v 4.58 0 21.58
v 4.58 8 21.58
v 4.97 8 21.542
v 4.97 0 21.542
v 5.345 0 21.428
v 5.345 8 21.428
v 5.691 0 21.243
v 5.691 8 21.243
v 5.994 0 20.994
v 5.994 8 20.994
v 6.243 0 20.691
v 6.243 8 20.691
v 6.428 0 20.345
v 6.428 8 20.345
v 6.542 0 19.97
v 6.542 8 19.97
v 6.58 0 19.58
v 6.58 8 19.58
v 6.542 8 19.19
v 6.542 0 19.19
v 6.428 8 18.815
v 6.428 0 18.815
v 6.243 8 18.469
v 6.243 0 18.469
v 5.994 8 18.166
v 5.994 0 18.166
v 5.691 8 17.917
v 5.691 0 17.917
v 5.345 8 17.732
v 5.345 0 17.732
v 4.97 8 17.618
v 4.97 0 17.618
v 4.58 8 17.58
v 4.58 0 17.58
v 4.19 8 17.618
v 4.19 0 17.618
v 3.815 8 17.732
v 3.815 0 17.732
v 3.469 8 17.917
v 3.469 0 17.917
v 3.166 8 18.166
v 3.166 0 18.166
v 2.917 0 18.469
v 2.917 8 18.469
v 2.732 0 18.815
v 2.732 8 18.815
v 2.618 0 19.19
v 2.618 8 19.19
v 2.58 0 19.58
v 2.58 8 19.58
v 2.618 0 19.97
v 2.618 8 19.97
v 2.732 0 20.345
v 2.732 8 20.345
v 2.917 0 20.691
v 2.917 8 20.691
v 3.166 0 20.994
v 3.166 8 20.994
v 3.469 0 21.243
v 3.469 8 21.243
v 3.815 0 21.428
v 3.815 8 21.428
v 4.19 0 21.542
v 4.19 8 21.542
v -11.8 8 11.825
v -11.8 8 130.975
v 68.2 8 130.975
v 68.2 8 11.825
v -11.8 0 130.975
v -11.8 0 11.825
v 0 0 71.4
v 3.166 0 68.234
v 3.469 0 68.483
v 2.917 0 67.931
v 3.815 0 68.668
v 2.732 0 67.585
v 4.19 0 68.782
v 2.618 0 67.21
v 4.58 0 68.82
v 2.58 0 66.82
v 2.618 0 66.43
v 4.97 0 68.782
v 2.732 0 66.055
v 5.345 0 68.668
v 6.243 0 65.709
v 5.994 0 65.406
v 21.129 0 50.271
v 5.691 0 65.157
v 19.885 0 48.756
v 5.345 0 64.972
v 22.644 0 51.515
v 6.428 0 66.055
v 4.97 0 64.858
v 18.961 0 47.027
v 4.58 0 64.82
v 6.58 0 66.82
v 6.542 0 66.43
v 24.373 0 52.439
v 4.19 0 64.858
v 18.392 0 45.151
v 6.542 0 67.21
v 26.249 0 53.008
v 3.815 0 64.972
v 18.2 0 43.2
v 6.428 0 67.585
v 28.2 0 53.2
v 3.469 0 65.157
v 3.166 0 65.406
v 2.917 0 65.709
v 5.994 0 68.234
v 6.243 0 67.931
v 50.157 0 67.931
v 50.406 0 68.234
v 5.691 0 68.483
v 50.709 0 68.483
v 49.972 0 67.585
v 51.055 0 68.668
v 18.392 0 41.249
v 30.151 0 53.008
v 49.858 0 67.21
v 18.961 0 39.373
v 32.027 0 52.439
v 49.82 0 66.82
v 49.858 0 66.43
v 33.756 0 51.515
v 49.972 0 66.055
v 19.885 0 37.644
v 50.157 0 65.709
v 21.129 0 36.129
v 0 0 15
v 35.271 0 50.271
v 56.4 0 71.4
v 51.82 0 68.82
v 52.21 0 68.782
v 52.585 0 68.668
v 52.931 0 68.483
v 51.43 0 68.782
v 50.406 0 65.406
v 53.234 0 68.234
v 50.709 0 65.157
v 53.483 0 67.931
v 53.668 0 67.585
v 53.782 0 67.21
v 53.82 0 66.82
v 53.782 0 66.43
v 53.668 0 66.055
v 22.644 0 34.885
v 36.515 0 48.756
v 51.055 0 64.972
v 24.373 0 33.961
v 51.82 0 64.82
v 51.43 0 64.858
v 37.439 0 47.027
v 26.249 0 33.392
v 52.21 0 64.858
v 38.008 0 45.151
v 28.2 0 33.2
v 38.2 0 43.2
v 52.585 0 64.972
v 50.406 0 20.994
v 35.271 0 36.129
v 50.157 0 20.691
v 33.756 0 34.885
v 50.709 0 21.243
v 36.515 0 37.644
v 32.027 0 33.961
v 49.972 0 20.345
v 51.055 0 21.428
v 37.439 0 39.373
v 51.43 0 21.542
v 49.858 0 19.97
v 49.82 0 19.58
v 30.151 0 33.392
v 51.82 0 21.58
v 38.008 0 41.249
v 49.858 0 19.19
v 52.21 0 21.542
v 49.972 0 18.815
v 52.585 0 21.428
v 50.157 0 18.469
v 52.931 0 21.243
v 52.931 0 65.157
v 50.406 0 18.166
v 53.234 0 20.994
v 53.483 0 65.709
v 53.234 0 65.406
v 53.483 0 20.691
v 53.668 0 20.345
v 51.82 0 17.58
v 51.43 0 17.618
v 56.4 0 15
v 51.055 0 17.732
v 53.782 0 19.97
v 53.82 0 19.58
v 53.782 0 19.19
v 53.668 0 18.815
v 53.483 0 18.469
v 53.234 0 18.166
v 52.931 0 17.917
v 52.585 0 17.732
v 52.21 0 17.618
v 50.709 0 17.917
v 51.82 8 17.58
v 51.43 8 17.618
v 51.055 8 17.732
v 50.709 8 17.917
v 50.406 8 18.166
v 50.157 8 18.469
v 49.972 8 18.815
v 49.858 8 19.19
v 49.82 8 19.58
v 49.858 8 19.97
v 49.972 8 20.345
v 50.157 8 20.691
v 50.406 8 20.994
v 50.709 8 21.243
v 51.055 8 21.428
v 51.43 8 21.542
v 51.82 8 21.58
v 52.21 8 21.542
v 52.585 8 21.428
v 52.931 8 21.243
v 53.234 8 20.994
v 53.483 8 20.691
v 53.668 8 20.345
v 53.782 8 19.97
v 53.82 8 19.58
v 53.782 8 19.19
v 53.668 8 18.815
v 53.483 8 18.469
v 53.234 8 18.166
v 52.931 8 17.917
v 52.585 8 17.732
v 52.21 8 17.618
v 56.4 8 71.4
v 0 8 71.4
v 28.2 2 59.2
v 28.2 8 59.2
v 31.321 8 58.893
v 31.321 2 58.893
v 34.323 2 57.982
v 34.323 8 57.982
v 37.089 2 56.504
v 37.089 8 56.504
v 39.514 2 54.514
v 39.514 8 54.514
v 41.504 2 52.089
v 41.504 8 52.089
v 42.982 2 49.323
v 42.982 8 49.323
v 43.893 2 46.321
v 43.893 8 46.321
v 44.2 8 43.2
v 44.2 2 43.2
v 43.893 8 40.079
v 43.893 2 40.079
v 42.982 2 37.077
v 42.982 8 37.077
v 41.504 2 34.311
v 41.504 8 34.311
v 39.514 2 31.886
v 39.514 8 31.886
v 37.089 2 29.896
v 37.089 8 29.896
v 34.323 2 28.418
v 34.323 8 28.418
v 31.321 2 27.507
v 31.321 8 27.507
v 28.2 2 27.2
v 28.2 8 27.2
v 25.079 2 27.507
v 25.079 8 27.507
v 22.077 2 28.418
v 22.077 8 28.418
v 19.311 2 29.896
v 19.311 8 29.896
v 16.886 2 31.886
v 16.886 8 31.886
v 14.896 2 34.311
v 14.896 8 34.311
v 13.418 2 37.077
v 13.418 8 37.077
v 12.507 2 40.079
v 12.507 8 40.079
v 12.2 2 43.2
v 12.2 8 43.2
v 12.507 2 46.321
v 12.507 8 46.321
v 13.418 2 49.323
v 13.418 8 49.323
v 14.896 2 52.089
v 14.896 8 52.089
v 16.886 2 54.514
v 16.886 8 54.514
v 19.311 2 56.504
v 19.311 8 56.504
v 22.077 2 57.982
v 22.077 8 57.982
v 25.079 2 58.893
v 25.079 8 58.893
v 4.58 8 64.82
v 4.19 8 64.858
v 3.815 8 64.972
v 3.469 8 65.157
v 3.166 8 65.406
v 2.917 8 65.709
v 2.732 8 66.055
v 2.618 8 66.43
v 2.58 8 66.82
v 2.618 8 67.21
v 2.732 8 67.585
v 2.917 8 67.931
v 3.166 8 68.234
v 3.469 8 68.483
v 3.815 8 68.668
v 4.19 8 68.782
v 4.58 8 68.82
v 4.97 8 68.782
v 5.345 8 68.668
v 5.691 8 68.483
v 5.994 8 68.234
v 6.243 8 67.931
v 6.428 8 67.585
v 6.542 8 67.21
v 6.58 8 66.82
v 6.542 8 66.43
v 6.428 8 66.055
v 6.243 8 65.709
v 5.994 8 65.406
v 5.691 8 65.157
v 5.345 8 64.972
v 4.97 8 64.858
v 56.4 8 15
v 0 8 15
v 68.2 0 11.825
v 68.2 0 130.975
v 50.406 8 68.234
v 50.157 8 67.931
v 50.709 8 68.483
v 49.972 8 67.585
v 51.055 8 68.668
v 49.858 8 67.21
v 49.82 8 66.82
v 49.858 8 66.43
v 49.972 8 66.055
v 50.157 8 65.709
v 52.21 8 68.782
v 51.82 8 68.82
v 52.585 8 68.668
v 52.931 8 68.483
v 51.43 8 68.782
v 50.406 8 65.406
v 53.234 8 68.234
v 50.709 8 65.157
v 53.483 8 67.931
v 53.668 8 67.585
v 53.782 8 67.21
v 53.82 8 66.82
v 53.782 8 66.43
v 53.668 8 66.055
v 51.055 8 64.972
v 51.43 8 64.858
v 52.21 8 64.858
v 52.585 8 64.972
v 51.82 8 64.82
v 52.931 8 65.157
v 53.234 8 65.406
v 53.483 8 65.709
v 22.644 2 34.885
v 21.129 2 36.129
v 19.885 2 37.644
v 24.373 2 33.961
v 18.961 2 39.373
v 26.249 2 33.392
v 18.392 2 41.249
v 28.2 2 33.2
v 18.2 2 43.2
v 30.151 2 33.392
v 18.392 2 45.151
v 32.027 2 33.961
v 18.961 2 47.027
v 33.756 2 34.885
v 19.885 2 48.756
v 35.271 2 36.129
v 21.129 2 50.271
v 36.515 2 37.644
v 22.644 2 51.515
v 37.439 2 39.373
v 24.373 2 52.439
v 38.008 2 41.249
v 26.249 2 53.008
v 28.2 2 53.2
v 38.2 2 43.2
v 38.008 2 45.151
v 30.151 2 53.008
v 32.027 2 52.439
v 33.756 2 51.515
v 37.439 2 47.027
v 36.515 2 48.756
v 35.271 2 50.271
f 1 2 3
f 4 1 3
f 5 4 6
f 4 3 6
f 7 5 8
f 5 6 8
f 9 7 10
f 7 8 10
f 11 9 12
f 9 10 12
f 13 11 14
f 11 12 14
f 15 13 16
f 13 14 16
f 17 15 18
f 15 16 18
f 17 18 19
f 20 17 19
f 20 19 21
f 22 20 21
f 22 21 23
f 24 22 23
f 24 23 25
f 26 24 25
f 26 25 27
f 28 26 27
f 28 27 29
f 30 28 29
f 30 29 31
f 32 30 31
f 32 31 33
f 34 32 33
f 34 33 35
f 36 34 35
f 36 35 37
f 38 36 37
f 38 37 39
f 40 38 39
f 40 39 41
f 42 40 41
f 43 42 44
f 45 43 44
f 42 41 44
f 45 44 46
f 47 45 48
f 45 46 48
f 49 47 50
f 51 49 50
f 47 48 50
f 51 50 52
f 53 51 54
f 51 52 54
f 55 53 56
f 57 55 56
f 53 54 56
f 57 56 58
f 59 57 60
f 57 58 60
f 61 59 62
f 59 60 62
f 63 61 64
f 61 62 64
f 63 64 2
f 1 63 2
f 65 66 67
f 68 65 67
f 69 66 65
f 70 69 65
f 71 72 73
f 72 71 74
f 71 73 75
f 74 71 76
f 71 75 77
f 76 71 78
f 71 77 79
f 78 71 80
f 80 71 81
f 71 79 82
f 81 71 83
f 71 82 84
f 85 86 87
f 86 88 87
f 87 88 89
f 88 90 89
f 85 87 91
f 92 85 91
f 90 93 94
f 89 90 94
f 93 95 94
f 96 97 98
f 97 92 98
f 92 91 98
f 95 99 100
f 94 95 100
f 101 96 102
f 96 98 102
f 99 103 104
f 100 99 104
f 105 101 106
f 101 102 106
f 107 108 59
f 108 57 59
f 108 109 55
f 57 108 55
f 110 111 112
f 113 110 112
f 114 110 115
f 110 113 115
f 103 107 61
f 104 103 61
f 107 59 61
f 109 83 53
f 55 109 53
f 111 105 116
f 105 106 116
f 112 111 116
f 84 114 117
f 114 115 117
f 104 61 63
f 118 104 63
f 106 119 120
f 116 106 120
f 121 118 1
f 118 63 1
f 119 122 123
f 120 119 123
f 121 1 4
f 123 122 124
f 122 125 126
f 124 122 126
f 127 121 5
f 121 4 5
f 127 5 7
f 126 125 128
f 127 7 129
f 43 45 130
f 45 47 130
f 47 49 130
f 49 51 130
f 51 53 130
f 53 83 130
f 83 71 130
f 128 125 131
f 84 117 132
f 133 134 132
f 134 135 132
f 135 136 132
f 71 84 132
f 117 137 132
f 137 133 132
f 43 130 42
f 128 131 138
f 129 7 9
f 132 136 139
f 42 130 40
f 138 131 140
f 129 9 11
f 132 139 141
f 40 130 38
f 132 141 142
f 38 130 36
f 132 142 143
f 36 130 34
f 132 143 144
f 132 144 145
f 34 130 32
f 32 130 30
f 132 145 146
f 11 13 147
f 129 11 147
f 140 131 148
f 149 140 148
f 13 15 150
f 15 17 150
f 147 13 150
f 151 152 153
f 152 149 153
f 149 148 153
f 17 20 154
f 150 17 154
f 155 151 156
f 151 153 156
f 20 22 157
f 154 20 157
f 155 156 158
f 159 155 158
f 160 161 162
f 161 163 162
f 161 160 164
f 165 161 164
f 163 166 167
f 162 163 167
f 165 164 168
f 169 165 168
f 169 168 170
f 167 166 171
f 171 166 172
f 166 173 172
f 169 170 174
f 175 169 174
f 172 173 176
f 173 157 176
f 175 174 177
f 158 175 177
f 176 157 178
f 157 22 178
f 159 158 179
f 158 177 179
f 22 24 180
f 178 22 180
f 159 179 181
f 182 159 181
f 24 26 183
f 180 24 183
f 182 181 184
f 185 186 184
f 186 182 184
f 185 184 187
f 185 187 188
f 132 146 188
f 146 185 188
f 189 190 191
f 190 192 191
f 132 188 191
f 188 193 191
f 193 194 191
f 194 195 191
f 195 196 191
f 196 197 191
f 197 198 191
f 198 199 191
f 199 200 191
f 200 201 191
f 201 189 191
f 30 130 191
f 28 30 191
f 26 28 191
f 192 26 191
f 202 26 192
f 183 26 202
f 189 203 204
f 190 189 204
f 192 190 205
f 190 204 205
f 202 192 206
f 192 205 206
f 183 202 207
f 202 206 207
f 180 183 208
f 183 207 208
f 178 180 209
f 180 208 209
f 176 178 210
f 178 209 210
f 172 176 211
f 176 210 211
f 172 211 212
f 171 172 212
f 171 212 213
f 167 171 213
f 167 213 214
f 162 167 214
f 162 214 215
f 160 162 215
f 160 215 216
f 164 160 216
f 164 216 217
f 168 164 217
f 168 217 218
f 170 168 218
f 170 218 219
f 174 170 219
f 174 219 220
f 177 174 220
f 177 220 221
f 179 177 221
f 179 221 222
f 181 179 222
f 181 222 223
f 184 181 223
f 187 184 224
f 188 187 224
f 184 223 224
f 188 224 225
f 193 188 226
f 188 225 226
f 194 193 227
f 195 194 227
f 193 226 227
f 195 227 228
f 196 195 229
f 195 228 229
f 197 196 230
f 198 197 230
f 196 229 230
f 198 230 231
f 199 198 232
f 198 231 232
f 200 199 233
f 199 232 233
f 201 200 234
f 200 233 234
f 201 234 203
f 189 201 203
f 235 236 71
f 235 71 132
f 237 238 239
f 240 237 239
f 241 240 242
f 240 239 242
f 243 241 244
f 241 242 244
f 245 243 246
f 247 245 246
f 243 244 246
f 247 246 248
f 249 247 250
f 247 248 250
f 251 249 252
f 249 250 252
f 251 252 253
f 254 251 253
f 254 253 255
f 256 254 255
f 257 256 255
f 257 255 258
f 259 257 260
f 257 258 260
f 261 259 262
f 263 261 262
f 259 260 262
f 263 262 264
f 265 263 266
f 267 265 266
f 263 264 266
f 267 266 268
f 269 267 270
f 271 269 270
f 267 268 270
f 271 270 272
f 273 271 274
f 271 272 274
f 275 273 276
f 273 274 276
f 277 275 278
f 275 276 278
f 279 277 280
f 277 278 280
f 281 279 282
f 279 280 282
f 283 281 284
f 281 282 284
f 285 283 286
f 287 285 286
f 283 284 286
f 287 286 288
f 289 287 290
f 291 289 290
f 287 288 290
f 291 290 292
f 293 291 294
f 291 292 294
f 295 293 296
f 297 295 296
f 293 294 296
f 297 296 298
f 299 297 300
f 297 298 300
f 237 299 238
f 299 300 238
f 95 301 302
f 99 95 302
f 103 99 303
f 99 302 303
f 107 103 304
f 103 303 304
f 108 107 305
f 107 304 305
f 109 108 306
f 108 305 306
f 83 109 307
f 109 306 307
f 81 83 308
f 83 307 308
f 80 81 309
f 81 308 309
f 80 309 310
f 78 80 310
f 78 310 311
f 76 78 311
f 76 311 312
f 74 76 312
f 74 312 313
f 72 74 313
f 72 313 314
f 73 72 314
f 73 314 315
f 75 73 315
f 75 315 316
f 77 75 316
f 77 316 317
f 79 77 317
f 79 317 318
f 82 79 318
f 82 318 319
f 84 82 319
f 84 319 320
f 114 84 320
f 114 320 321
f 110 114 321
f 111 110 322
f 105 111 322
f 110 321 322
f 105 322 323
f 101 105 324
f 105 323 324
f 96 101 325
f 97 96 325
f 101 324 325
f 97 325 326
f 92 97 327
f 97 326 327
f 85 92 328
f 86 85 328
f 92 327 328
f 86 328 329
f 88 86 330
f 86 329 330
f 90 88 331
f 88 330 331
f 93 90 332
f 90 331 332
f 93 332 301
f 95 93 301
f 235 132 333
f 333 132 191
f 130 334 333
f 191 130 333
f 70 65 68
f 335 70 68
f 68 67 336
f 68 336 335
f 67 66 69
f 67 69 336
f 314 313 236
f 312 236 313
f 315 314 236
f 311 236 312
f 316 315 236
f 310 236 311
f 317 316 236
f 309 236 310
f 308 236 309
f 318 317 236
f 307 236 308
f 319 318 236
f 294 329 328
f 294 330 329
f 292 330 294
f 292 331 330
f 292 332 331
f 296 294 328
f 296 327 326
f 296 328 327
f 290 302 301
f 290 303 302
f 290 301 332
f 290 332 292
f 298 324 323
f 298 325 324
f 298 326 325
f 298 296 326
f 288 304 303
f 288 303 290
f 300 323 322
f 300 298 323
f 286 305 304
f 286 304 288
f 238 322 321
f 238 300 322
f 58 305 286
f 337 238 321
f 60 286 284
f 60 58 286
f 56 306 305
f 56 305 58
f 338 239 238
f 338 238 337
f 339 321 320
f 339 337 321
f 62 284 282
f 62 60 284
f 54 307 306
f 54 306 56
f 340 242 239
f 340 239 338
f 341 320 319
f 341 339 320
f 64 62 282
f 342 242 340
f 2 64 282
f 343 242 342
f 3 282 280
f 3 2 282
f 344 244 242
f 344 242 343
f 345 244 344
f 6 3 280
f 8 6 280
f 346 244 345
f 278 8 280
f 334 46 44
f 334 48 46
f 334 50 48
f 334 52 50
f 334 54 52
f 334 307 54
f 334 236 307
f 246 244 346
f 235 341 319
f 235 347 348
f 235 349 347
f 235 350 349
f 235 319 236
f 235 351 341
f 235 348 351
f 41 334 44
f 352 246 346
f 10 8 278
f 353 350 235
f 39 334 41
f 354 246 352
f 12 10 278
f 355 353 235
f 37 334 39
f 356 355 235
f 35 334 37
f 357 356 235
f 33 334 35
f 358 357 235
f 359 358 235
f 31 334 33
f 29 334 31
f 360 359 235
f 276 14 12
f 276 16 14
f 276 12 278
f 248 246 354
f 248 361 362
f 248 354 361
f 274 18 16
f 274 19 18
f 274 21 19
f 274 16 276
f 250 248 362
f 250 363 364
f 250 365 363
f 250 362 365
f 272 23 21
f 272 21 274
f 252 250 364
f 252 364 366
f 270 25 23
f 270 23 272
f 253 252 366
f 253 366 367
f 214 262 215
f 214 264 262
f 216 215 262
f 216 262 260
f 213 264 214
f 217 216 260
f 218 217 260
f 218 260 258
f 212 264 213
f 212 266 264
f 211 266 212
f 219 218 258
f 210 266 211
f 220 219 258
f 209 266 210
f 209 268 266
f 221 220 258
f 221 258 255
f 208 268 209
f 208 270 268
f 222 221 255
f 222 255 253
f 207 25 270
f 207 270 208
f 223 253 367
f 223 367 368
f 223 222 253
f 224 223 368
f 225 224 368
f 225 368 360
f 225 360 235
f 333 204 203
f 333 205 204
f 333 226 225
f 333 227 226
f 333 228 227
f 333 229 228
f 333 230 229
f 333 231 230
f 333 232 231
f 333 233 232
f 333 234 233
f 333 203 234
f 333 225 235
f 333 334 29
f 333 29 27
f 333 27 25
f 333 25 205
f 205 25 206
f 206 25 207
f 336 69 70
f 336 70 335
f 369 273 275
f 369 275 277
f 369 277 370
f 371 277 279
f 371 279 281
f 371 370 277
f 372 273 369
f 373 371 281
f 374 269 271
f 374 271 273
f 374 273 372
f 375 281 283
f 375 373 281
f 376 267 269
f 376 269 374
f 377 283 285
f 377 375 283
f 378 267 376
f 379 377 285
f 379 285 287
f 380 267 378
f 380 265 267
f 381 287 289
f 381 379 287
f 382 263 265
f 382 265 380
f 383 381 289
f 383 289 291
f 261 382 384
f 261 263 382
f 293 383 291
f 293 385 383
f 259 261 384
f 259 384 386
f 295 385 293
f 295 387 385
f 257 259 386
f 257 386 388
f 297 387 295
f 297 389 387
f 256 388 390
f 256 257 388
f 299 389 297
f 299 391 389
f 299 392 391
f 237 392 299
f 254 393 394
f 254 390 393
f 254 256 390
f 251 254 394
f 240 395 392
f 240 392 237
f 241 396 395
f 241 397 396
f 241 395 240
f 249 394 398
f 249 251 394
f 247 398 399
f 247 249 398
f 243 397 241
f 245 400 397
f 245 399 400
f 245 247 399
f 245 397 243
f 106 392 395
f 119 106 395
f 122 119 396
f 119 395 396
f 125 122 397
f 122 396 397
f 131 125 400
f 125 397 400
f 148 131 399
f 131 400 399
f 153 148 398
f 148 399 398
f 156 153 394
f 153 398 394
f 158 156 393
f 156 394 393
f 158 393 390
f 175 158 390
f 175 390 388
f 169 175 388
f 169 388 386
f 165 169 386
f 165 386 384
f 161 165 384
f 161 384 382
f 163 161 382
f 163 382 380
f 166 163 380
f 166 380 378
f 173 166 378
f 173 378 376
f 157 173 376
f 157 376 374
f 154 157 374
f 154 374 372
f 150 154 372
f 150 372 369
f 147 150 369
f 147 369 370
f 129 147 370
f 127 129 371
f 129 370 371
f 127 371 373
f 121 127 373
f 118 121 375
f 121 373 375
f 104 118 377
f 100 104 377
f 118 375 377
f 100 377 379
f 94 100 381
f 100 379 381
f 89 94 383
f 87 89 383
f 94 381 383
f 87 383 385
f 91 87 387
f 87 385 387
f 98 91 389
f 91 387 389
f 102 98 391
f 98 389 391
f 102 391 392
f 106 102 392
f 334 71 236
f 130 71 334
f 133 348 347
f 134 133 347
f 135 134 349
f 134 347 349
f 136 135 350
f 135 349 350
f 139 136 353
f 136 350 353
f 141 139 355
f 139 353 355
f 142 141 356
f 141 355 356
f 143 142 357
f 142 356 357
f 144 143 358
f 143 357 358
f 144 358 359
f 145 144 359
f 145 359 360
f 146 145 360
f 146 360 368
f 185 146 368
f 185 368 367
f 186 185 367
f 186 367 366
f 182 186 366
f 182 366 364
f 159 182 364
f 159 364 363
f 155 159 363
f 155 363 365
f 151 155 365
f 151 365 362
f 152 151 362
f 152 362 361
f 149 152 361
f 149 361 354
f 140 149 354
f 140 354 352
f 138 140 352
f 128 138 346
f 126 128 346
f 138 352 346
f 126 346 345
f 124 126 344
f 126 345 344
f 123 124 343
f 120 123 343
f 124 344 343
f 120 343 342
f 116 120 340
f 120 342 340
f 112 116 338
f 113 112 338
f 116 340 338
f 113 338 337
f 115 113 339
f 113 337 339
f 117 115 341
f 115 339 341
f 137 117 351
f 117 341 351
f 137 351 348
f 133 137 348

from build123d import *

# Parameters (mm, degrees)
SKETCH1_W           = 56.4
SKETCH1_H           = 142.8
BOSS_EXTRUDE1_DEPTH = 8
SKETCH2_R           = 16
CUT_EXTRUDE1_DEPTH  = 6
SKETCH3_R           = 10
CUT_EXTRUDE2_DEPTH  = 154.651553848
SKETCH4_R           = 2
CUT_EXTRUDE3_DEPTH  = 154.7426421
FILLET2_R           = 3
SKETCH6_W           = 80
SKETCH6_H           = 119.15
BOSS_EXTRUDE2_DEPTH = 8
SKETCH9_R           = 2
CUT_EXTRUDE5_DEPTH  = 10


with BuildPart() as part:
    # Sketch1 → Boss-Extrude1 (new body)
    with BuildSketch(Plane(origin=(0, 0, 0), x_dir=(1, 0, 0), z_dir=(0, 1, 0))):
        with Locations((28.2, -71.4)):
            Rectangle(SKETCH1_W, SKETCH1_H)
    extrude(amount=BOSS_EXTRUDE1_DEPTH)

    # Sketch2 → Cut-Extrude1 (cut)
    with BuildSketch(Plane(origin=(0, 8, 0), x_dir=(1, 0, 0), z_dir=(0, 1, 0))):
        with Locations(Location((28.2, -43.2, 0), (0, 0, 270))):
            Circle(SKETCH2_R)
    extrude(amount=-CUT_EXTRUDE1_DEPTH, mode=Mode.SUBTRACT)

    # Sketch3 → Cut-Extrude2 (cut, through all)
    with BuildSketch(Plane(origin=(0, 2, 0), x_dir=(1, 0, 0), z_dir=(0, 1, 0))):
        with Locations(Location((28.2, -43.2, 0), (0, 0, 270))):
            Circle(SKETCH3_R)
    extrude(amount=-CUT_EXTRUDE2_DEPTH, mode=Mode.SUBTRACT)

    # Sketch4 → Cut-Extrude3 (cut, through all)
    with BuildSketch(Plane(origin=(0, 8, 0), x_dir=(1, 0, 0), z_dir=(0, 1, 0))):
        with Locations(Location((4.58, -19.58, 0), (0, 0, 270))):
            Circle(SKETCH4_R)
        with Locations(Location((51.82, -19.58, 0), (0, 0, 90))):
            Circle(SKETCH4_R)
        with Locations(Location((51.82, -66.82, 0), (0, 0, 270))):
            Circle(SKETCH4_R)
        with Locations(Location((4.58, -66.82, 0), (0, 0, 90))):
            Circle(SKETCH4_R)
    cut_extrude3 = extrude(amount=-CUT_EXTRUDE3_DEPTH, mode=Mode.SUBTRACT)

    # Mirror1: Cut-Extrude3 across plane
    add(cut_extrude3.mirror(Plane.XY.offset(71.4)), mode=Mode.SUBTRACT)

    # Fillet2
    fillet2_edges = [part.edges().sort_by_distance(p)[0] for p in [
        (0, 4, 0),
        (56.4, 4, 0),
        (56.4, 4, 142.8),
        (0, 4, 142.8),
    ]]
    fillet(fillet2_edges, radius=FILLET2_R)

    # Sketch9 → Cut-Extrude5 (cut)
    with BuildSketch(Plane(origin=(0, 8, 0), x_dir=(1, 0, 0), z_dir=(0, 1, 0))):
        with Locations(Location((7.5, -7.5, 0), (0, 0, 270))):
            Circle(SKETCH9_R)
        with Locations(Location((28.2, -7.5, 0), (0, 0, 270))):
            Circle(SKETCH9_R)
        with Locations(Location((48.9, -7.5, 0), (0, 0, 270))):
            Circle(SKETCH9_R)
    cut_extrude5 = extrude(amount=-CUT_EXTRUDE5_DEPTH, mode=Mode.SUBTRACT)

    # Mirror2: Cut-Extrude5 across plane
    add(cut_extrude5.mirror(Plane.XY.offset(71.4)), mode=Mode.SUBTRACT)

    # SurfaceCut1
    split(bisect_by=Plane.XY.offset(71.4), keep=Keep.BOTTOM)

    # SurfaceCut2
    split(bisect_by=Plane.XY.offset(15), keep=Keep.TOP)


with BuildPart() as body_2:
    # Sketch6 → Boss-Extrude2 (new body)
    with BuildSketch(Plane(origin=(0, 8, 0), x_dir=(1, 0, 0), z_dir=(0, 1, 0))):
        with Locations((28.2, -71.4)):
            Rectangle(SKETCH6_W, SKETCH6_H)
    extrude(amount=-BOSS_EXTRUDE2_DEPTH)


solid = Compound([part.part, body_2.part])
